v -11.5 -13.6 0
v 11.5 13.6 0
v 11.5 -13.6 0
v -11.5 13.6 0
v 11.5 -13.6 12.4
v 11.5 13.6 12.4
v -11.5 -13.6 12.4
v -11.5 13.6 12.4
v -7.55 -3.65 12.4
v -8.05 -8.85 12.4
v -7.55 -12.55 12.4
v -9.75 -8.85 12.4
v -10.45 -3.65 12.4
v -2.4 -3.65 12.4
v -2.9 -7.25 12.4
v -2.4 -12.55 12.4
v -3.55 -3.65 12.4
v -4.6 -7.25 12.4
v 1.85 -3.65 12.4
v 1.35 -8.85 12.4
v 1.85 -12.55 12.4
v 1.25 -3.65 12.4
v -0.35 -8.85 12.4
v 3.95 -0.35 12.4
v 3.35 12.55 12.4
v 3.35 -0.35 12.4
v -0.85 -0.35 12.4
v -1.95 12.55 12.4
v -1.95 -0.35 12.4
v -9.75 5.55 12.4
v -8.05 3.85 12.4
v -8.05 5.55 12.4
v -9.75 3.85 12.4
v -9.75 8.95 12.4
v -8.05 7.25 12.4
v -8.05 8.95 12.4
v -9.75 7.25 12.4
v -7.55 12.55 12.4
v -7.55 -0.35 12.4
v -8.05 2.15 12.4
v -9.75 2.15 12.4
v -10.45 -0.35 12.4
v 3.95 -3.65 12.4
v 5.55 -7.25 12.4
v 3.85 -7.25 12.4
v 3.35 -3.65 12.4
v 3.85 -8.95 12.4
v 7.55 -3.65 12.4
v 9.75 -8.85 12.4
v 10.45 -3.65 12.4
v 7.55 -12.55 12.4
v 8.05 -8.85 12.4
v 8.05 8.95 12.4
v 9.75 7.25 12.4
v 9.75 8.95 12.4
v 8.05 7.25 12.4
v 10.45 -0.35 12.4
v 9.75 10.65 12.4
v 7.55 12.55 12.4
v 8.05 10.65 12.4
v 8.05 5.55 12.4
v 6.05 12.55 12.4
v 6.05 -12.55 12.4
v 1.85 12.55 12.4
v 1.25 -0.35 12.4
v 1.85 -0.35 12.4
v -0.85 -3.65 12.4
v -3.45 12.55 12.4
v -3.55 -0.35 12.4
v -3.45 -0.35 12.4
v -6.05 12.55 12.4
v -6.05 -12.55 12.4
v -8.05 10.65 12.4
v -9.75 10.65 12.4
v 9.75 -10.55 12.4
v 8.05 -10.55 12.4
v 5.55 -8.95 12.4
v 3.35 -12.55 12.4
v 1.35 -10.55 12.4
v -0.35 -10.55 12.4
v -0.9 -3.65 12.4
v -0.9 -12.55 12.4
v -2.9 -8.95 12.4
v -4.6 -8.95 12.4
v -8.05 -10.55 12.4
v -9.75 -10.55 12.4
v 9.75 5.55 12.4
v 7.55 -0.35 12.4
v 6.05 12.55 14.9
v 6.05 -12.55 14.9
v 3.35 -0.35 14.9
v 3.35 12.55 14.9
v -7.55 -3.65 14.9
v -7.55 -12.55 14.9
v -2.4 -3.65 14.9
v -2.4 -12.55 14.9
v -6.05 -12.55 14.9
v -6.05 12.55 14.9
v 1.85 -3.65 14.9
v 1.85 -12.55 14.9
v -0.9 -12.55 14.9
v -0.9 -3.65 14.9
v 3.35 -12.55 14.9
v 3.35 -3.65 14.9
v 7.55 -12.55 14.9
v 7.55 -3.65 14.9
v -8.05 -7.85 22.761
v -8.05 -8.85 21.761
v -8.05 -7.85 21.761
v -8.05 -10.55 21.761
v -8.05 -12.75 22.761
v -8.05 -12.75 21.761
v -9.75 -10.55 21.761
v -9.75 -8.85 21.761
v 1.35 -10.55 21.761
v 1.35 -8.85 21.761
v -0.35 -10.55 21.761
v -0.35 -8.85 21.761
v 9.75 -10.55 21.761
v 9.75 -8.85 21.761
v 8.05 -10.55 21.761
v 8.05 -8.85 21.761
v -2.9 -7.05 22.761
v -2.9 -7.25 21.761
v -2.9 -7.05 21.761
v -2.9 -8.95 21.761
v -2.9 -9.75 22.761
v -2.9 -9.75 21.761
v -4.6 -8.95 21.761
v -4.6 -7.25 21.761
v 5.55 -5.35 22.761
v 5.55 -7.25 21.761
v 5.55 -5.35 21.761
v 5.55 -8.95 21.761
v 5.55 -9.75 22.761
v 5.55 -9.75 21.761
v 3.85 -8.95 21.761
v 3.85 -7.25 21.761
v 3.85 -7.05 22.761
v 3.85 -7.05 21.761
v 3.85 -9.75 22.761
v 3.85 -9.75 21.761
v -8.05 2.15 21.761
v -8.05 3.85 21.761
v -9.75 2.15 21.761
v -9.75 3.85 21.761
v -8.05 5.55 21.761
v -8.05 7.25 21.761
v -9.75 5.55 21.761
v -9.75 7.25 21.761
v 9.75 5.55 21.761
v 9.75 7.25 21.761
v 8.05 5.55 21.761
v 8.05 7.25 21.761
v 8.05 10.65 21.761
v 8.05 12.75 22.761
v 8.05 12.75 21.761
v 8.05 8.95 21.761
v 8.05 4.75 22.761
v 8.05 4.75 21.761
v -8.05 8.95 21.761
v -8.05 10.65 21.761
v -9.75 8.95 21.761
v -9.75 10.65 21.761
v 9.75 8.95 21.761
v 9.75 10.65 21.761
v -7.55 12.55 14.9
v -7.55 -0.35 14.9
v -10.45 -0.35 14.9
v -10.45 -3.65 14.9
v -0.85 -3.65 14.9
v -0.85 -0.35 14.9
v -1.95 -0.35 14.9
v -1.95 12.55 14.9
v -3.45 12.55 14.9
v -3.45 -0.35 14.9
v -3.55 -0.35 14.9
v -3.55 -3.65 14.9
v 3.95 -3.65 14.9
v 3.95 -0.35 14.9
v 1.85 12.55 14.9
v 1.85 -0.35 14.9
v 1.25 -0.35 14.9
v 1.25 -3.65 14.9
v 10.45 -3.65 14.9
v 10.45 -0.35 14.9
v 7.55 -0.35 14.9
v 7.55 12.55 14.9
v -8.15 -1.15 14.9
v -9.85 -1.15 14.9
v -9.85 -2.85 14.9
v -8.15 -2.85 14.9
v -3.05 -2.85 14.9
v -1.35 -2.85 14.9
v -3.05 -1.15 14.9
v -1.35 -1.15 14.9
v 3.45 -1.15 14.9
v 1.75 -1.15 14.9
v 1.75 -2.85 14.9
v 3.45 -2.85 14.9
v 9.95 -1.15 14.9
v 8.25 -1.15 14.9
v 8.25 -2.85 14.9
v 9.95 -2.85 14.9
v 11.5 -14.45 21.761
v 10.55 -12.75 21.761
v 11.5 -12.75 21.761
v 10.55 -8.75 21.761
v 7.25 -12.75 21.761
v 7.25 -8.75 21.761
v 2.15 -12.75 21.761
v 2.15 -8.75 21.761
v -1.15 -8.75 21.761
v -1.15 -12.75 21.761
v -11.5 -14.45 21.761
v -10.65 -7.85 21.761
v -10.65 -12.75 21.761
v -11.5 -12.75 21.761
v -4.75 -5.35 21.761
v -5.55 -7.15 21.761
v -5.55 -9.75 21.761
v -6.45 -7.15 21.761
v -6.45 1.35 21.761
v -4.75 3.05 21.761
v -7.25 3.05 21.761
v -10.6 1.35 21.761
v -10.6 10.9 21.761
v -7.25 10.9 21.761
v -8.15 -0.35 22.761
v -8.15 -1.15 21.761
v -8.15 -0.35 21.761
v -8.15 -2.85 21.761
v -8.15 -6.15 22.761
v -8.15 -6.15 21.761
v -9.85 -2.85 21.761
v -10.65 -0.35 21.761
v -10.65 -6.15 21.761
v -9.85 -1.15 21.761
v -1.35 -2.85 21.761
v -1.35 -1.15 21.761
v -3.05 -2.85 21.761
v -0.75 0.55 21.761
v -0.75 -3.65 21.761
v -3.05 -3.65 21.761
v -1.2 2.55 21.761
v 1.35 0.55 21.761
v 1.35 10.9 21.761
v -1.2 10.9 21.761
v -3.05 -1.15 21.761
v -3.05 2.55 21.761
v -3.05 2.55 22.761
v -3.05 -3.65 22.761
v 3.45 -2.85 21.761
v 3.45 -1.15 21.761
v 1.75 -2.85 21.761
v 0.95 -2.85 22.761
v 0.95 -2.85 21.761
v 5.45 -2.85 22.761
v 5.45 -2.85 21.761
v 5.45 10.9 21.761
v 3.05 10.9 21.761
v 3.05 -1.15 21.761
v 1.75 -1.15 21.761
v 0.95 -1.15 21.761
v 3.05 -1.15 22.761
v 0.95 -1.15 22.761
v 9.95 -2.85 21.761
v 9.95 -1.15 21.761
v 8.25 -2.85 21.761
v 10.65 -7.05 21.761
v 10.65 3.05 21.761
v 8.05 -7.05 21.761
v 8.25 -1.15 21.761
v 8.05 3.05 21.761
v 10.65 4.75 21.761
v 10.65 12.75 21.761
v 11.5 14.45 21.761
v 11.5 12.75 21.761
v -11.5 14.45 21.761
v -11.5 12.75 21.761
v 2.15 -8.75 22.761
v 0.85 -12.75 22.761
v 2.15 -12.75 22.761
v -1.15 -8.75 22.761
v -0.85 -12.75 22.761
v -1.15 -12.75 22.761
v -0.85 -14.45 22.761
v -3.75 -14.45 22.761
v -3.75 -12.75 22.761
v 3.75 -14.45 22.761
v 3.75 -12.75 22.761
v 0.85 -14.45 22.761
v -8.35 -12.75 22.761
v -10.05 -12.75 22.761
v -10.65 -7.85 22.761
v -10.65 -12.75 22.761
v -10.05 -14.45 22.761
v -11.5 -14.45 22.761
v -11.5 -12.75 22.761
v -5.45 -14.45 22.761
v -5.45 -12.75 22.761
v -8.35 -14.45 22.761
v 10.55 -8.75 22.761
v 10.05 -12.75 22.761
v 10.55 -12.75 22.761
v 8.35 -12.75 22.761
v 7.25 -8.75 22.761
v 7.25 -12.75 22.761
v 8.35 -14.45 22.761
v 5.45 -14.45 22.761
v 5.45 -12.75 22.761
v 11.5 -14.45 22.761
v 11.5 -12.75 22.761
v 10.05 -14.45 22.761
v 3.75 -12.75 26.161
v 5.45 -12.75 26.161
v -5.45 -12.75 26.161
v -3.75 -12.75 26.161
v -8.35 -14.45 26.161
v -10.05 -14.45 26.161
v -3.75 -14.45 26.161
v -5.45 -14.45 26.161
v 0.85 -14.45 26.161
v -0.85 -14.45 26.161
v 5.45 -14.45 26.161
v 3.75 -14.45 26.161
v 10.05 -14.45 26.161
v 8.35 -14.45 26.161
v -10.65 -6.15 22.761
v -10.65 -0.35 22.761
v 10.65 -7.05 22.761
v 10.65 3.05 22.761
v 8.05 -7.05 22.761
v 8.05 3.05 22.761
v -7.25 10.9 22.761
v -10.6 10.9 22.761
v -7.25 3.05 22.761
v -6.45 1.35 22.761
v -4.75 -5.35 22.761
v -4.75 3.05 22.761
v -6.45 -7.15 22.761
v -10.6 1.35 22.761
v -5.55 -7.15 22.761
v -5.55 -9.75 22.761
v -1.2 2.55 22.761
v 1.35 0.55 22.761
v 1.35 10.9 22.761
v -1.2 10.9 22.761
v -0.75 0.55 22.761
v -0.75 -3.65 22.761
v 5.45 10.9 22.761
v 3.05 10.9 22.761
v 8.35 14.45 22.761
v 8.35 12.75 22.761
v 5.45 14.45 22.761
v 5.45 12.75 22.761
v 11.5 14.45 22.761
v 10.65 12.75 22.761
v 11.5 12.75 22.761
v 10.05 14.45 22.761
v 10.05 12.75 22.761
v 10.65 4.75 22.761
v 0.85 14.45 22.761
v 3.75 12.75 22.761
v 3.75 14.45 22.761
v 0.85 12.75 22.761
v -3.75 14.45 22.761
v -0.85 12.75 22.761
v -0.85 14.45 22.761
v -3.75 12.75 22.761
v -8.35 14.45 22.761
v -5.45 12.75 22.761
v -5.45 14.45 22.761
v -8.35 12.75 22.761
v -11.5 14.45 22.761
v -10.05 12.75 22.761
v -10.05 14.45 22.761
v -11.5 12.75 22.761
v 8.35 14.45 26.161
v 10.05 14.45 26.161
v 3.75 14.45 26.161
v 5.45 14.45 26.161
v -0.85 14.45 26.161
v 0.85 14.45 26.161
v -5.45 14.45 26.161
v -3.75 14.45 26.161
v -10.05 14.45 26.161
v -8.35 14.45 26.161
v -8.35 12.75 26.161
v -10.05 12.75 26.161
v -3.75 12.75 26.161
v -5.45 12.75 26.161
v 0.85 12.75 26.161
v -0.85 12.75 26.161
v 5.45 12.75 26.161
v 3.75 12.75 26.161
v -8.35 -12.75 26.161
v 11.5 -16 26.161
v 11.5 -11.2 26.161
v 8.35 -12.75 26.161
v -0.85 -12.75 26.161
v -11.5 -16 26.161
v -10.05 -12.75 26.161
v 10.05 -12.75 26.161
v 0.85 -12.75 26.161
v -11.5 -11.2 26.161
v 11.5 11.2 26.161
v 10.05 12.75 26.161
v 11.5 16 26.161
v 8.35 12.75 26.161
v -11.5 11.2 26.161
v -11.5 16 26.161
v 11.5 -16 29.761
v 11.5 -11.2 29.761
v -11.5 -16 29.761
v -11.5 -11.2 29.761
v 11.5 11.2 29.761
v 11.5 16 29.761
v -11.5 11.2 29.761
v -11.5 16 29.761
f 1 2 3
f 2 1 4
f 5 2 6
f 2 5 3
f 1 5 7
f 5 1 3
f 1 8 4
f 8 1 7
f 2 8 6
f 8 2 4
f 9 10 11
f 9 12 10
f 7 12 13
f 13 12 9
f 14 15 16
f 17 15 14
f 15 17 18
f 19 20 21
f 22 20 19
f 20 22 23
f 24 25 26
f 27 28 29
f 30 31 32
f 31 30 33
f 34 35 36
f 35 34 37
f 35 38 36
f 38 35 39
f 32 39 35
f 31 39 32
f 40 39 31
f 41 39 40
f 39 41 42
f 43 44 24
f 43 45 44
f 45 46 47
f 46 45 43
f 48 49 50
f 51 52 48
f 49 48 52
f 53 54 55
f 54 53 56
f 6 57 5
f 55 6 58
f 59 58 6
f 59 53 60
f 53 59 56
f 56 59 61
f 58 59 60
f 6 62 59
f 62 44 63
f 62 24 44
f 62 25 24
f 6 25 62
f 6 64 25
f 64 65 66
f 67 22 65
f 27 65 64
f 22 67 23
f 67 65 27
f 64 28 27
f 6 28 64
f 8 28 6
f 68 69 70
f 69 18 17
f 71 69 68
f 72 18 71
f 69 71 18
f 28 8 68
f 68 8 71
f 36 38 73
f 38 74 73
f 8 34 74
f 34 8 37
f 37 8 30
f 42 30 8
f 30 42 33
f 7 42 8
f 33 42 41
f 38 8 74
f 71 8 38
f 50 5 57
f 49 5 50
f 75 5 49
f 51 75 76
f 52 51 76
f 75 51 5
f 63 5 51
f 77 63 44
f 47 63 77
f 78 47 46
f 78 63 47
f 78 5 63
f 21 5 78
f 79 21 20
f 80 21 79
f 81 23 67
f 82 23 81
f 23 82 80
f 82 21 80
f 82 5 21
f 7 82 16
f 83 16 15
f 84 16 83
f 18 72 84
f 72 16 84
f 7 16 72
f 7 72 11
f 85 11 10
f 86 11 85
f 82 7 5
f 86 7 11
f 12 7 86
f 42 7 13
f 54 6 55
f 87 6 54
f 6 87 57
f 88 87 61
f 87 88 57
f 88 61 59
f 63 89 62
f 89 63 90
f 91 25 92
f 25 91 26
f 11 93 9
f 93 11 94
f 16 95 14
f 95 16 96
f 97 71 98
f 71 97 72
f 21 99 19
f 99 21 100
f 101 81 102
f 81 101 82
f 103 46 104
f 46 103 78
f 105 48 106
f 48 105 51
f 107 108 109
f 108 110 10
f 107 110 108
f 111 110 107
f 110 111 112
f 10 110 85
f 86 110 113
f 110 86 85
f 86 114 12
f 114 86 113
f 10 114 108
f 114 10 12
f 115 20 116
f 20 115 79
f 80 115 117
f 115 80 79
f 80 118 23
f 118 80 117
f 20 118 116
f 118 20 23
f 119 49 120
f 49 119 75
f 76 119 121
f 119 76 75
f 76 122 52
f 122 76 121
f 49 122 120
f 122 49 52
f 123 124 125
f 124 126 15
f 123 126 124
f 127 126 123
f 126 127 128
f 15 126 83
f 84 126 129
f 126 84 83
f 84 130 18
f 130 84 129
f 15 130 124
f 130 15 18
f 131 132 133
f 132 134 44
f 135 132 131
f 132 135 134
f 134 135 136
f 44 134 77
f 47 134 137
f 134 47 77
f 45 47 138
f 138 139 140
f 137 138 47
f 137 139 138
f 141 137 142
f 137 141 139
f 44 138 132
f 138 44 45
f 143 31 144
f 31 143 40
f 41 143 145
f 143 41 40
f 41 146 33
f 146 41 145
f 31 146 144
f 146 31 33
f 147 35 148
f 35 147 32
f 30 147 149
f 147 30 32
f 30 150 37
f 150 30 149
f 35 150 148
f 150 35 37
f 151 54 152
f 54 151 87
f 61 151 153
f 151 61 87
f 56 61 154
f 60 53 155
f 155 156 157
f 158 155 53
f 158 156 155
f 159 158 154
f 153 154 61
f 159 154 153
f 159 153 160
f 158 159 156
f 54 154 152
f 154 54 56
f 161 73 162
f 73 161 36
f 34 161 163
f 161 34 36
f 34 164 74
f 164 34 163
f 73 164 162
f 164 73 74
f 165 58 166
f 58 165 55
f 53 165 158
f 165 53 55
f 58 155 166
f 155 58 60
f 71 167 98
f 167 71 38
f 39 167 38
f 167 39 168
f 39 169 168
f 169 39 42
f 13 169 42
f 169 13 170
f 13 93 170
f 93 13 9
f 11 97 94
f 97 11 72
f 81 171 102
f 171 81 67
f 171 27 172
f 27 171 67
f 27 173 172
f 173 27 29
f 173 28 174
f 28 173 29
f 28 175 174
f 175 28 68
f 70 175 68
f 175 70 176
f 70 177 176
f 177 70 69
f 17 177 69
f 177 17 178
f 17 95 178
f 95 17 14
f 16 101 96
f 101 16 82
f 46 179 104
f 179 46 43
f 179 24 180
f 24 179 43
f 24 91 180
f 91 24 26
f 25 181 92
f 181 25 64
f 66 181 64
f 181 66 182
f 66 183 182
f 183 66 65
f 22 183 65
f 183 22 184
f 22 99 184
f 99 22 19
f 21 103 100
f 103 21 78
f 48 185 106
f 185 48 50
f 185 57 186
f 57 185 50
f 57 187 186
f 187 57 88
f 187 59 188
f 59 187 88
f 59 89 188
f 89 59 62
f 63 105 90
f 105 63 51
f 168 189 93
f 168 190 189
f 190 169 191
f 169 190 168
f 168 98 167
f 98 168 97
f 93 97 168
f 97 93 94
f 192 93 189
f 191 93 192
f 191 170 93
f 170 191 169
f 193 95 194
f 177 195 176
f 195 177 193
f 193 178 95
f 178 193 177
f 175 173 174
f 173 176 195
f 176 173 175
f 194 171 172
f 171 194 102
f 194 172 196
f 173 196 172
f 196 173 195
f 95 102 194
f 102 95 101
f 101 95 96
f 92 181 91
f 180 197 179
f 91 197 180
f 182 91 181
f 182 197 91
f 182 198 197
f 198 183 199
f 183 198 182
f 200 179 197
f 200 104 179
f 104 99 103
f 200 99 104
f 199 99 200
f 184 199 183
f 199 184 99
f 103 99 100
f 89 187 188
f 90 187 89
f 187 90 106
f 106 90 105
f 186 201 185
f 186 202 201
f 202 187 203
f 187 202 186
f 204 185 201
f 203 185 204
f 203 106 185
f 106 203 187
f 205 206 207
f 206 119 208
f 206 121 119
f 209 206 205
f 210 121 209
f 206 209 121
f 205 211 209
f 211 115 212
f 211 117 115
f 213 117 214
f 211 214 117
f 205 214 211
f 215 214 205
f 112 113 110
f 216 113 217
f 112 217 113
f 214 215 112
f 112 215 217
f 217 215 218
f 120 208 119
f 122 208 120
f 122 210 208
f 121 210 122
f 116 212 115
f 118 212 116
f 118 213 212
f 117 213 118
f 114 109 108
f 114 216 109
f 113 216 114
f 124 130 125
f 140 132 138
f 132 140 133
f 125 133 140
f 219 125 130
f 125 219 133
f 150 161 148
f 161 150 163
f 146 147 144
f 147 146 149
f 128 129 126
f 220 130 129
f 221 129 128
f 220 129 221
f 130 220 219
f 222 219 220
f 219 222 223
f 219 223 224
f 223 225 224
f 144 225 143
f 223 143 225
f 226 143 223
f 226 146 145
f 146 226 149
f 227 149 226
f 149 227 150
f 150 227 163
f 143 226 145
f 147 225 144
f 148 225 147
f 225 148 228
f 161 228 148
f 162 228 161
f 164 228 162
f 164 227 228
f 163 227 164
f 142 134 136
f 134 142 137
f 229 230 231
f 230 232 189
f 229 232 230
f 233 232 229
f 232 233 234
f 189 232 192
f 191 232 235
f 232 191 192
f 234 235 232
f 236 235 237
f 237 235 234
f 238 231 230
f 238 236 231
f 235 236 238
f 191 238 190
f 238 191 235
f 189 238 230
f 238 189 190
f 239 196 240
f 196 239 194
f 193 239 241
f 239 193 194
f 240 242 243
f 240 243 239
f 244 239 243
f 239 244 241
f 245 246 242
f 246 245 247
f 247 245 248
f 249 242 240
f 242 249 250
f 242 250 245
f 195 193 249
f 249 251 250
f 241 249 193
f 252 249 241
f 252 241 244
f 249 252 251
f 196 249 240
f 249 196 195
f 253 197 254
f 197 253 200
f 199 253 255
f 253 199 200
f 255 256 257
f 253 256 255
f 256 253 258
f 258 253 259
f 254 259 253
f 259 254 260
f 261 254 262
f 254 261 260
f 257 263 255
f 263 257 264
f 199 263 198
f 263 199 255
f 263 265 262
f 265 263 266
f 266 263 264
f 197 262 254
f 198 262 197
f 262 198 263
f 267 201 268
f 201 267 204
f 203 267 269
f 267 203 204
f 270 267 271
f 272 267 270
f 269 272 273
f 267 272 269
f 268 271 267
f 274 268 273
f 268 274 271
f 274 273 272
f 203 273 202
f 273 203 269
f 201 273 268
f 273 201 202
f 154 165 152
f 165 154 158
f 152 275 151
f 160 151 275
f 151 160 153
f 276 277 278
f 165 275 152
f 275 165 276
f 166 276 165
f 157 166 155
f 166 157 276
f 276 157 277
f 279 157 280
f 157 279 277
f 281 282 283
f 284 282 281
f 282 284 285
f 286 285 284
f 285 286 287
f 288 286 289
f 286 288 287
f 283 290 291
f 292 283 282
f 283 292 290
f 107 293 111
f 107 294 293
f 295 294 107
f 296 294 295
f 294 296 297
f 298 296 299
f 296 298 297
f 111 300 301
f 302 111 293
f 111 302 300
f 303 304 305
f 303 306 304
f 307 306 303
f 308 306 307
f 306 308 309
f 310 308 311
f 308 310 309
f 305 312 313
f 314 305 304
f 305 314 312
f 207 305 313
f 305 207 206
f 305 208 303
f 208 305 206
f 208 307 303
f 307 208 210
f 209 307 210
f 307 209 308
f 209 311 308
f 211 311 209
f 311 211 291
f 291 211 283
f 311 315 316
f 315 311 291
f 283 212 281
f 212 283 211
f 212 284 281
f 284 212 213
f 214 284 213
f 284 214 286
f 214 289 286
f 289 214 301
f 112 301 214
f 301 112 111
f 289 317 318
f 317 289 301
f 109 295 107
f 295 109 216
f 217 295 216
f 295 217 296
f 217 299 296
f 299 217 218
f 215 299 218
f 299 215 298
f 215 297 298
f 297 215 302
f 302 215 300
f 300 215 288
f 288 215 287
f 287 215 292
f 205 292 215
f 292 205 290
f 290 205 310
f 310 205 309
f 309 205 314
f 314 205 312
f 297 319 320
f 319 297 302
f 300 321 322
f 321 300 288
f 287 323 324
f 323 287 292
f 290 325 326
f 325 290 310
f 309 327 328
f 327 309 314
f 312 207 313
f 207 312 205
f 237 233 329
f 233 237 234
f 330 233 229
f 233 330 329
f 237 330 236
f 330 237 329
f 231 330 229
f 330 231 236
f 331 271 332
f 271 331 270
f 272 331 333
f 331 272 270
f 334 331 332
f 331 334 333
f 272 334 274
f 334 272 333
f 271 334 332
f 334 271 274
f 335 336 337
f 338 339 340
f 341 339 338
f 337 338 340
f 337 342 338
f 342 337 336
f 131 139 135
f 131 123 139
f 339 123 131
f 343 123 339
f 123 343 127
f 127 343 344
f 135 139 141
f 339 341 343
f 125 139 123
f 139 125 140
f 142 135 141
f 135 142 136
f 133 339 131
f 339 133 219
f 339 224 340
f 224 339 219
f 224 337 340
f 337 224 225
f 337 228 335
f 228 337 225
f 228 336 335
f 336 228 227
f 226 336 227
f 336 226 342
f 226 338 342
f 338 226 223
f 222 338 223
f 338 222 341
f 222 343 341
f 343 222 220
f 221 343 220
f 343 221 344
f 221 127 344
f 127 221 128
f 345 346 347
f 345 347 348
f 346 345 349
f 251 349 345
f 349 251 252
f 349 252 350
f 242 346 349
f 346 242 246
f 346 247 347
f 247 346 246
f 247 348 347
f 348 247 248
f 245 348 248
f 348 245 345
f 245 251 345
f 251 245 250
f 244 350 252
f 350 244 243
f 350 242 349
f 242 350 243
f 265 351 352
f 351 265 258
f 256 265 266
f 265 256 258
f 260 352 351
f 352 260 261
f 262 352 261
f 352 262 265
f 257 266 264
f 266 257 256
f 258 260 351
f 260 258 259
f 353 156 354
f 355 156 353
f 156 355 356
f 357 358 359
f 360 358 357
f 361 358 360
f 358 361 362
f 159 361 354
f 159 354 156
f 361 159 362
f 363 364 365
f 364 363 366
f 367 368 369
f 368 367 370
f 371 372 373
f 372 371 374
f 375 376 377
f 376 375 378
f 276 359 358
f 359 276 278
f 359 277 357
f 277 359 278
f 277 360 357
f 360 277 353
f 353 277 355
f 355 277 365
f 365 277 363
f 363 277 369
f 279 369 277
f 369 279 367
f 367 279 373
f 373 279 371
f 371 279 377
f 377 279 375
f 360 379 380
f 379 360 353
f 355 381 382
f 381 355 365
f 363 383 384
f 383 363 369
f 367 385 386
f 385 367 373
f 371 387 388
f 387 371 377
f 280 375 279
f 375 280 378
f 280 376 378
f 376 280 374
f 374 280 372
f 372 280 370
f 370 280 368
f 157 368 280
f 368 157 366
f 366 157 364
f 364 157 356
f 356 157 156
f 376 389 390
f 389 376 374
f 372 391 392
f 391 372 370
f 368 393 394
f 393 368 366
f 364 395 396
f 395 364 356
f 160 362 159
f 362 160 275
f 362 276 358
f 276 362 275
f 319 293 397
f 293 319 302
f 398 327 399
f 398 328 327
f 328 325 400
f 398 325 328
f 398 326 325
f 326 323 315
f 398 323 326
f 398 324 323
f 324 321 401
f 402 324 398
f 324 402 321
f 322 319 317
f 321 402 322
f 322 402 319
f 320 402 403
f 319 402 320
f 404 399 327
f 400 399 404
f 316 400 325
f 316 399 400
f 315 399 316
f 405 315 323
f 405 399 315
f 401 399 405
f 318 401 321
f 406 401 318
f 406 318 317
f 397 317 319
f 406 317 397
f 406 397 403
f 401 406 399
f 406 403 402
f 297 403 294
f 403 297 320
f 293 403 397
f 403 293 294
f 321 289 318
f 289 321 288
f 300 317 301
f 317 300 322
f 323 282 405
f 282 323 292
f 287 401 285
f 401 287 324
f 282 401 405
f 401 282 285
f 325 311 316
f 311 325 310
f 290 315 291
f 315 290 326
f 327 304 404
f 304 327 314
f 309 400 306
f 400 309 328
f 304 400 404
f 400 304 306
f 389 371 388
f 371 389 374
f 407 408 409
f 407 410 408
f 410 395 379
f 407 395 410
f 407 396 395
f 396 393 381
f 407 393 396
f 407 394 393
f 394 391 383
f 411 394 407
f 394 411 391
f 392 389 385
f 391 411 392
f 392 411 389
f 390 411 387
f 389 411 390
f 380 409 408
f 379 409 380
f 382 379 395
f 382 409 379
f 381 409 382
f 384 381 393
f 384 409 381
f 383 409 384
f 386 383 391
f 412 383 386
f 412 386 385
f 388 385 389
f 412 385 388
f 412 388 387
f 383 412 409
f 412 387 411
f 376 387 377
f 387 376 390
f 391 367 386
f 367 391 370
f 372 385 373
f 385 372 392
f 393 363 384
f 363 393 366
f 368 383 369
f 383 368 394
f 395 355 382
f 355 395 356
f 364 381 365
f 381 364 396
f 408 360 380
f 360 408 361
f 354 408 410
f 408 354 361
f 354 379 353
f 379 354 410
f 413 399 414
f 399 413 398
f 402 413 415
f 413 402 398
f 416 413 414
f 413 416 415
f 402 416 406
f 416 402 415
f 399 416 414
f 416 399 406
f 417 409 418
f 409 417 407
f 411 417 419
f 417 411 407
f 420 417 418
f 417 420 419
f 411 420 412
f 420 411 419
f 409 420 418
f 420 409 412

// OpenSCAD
// Generated by SolidPython 0.4.2 on 2020-09-29 23:21:37
//!OpenSCAD

scale(v = 0.0100000000) {
	translate(v = [-1150, -1360, 0]) {
		union() {
			color(c = [0.4000000000, 0.4000000000, 0.4000000000]) {
				translate(v = [0, 0, 0]) {
					linear_extrude(height = 1000.0000000000) {
						polygon(paths = [[0, 1, 2, 3]], points = [[0, 0], [0, 2720], [2300, 2720], [2300, 0]]);
					}
				}
			}
			color(c = [0.2000000000, 0.6000000000, 0.2000000000]) {
				translate(v = [0, 0, 1000.0000000000]) {
					linear_extrude(height = 120.0000000000) {
						polygon(paths = [[0, 1, 2, 3]], points = [[0, 1305], [0, 2720], [2300, 2720], [2300, 1305]]);
					}
				}
			}
			color(c = [0.4000000000, 0.4000000000, 0.4000000000]) {
				translate(v = [0, 0, 1000.0000000000]) {
					linear_extrude(height = 120.0000000000) {
						polygon(paths = [[0, 1, 2, 3]], points = [[0, 0], [0, 1305], [2300, 1305], [2300, 0]]);
					}
				}
			}
			color(c = [0.9000000000, 0.6000000000, 0.6000000000]) {
				translate(v = [0, 0, 1120.0000000000]) {
					linear_extrude(height = 120.0000000000) {
						polygon(paths = [[0, 1, 2, 3]], points = [[135, 1485], [135, 2485], [395, 2485], [395, 1485]]);
					}
				}
			}
			color(c = [0.9000000000, 0.6000000000, 0.6000000000]) {
				translate(v = [0, 0, 1120.0000000000]) {
					linear_extrude(height = 120.0000000000) {
						polygon(paths = [[0, 1, 2, 3]], points = [[545, 1485], [545, 2485], [805, 2485], [805, 1485]]);
					}
				}
			}
			color(c = [0.9000000000, 0.6000000000, 0.6000000000]) {
				translate(v = [0, 0, 1120.0000000000]) {
					linear_extrude(height = 120.0000000000) {
						polygon(paths = [[0, 1, 2, 3]], points = [[955, 1485], [955, 2485], [1335, 2485], [1335, 1485]]);
					}
				}
			}
			color(c = [0.9000000000, 0.6000000000, 0.6000000000]) {
				translate(v = [0, 0, 1120.0000000000]) {
					linear_extrude(height = 120.0000000000) {
						polygon(paths = [[0, 1, 2, 3]], points = [[1485, 1485], [1485, 2485], [1755, 2485], [1755, 1485]]);
					}
				}
			}
			color(c = [0.9000000000, 0.6000000000, 0.6000000000]) {
				translate(v = [0, 0, 1120.0000000000]) {
					linear_extrude(height = 120.0000000000) {
						polygon(paths = [[0, 1, 2, 3]], points = [[1905, 1485], [1905, 2485], [2165, 2485], [2165, 1485]]);
					}
				}
			}
			color(c = [0.9000000000, 0.6000000000, 0.9000000000]) {
				translate(v = [0, 0, 1120.0000000000]) {
					linear_extrude(height = 120.0000000000) {
						polygon(paths = [[0, 1, 2, 3]], points = [[135, 235], [135, 885], [395, 885], [395, 235]]);
					}
				}
			}
			color(c = [0.9000000000, 0.6000000000, 0.9000000000]) {
				translate(v = [0, 0, 1120.0000000000]) {
					linear_extrude(height = 120.0000000000) {
						polygon(paths = [[0, 1, 2, 3]], points = [[545, 235], [545, 885], [910, 885], [910, 235]]);
					}
				}
			}
			color(c = [0.9000000000, 0.6000000000, 0.9000000000]) {
				translate(v = [0, 0, 1120.0000000000]) {
					linear_extrude(height = 120.0000000000) {
						polygon(paths = [[0, 1, 2, 3]], points = [[1060, 235], [1060, 885], [1335, 885], [1335, 235]]);
					}
				}
			}
			color(c = [0.9000000000, 0.6000000000, 0.9000000000]) {
				translate(v = [0, 0, 1120.0000000000]) {
					linear_extrude(height = 120.0000000000) {
						polygon(paths = [[0, 1, 2, 3]], points = [[1485, 235], [1485, 885], [1755, 885], [1755, 235]]);
					}
				}
			}
			color(c = [0.9000000000, 0.6000000000, 0.9000000000]) {
				translate(v = [0, 0, 1120.0000000000]) {
					linear_extrude(height = 120.0000000000) {
						polygon(paths = [[0, 1, 2, 3]], points = [[1905, 235], [1905, 885], [2165, 885], [2165, 235]]);
					}
				}
			}
			color(c = [0.2000000000, 0.6000000000, 0.2000000000]) {
				translate(v = [0, 0, 1120.0000000000]) {
					linear_extrude(height = 120.0000000000) {
						difference() {
							polygon(paths = [[0, 1, 2, 3]], points = [[0, 1305], [0, 2720], [2300, 2720], [2300, 1305]]);
							polygon(paths = [[0, 1, 2, 3]], points = [[135, 1485], [395, 1485], [395, 2485], [135, 2485]]);
							polygon(paths = [[0, 1, 2, 3]], points = [[545, 1485], [805, 1485], [805, 2485], [545, 2485]]);
							polygon(paths = [[0, 1, 2, 3]], points = [[955, 1485], [1335, 1485], [1335, 2485], [955, 2485]]);
							polygon(paths = [[0, 1, 2, 3]], points = [[1485, 1485], [1755, 1485], [1755, 2485], [1485, 2485]]);
							polygon(paths = [[0, 1, 2, 3]], points = [[1905, 1485], [2165, 1485], [2165, 2485], [1905, 2485]]);
						}
					}
				}
			}
			color(c = [0.4000000000, 0.4000000000, 0.4000000000]) {
				translate(v = [0, 0, 1120.0000000000]) {
					linear_extrude(height = 120.0000000000) {
						difference() {
							polygon(paths = [[0, 1, 2, 3]], points = [[0, 0], [0, 1305], [2300, 1305], [2300, 0]]);
							polygon(paths = [[0, 1, 2, 3]], points = [[135, 235], [395, 235], [395, 885], [135, 885]]);
							polygon(paths = [[0, 1, 2, 3]], points = [[545, 235], [910, 235], [910, 885], [545, 885]]);
							polygon(paths = [[0, 1, 2, 3]], points = [[1060, 235], [1335, 235], [1335, 885], [1060, 885]]);
							polygon(paths = [[0, 1, 2, 3]], points = [[1485, 235], [1755, 235], [1755, 885], [1485, 885]]);
							polygon(paths = [[0, 1, 2, 3]], points = [[1905, 235], [2165, 235], [2165, 885], [1905, 885]]);
						}
					}
				}
			}
			color(c = [0.1000000000, 0.1000000000, 0.1000000000]) {
				translate(v = [0, 0, 1240.0000000000]) {
					linear_extrude(height = 70.0000000000) {
						polygon(paths = [[0, 1, 2, 3]], points = [[175, 305], [175, 475], [345, 475], [345, 305]]);
					}
				}
			}
			color(c = [0.1000000000, 0.1000000000, 0.1000000000]) {
				translate(v = [0, 0, 1240.0000000000]) {
					linear_extrude(height = 70.0000000000) {
						polygon(paths = [[0, 1, 2, 3]], points = [[1115, 305], [1115, 475], [1285, 475], [1285, 305]]);
					}
				}
			}
			color(c = [0.1000000000, 0.1000000000, 0.1000000000]) {
				translate(v = [0, 0, 1240.0000000000]) {
					linear_extrude(height = 70.0000000000) {
						polygon(paths = [[0, 1, 2, 3]], points = [[1955, 305], [1955, 475], [2125, 475], [2125, 305]]);
					}
				}
			}
			color(c = [0.1000000000, 0.1000000000, 0.1000000000]) {
				translate(v = [0, 0, 1240.0000000000]) {
					linear_extrude(height = 70.0000000000) {
						polygon(paths = [[0, 1, 2, 3]], points = [[690, 465], [690, 635], [860, 635], [860, 465]]);
					}
				}
			}
			color(c = [0.1000000000, 0.1000000000, 0.1000000000]) {
				translate(v = [0, 0, 1240.0000000000]) {
					linear_extrude(height = 70.0000000000) {
						polygon(paths = [[0, 1, 2, 3]], points = [[1535, 465], [1535, 635], [1705, 635], [1705, 465]]);
					}
				}
			}
			color(c = [0.1000000000, 0.1000000000, 0.1000000000]) {
				translate(v = [0, 0, 1240.0000000000]) {
					linear_extrude(height = 70.0000000000) {
						polygon(paths = [[0, 1, 2, 3]], points = [[175, 1575], [175, 1745], [345, 1745], [345, 1575]]);
					}
				}
			}
			color(c = [0.1000000000, 0.1000000000, 0.1000000000]) {
				translate(v = [0, 0, 1240.0000000000]) {
					linear_extrude(height = 70.0000000000) {
						polygon(paths = [[0, 1, 2, 3]], points = [[175, 1915], [175, 2085], [345, 2085], [345, 1915]]);
					}
				}
			}
			color(c = [0.1000000000, 0.1000000000, 0.1000000000]) {
				translate(v = [0, 0, 1240.0000000000]) {
					linear_extrude(height = 70.0000000000) {
						polygon(paths = [[0, 1, 2, 3]], points = [[1955, 1915], [1955, 2085], [2125, 2085], [2125, 1915]]);
					}
				}
			}
			color(c = [0.1000000000, 0.1000000000, 0.1000000000]) {
				translate(v = [0, 0, 1240.0000000000]) {
					linear_extrude(height = 70.0000000000) {
						polygon(paths = [[0, 1, 2, 3]], points = [[175, 2255], [175, 2425], [345, 2425], [345, 2255]]);
					}
				}
			}
			color(c = [0.1000000000, 0.1000000000, 0.1000000000]) {
				translate(v = [0, 0, 1240.0000000000]) {
					linear_extrude(height = 70.0000000000) {
						polygon(paths = [[0, 1, 2, 3]], points = [[1955, 2255], [1955, 2425], [2125, 2425], [2125, 2255]]);
					}
				}
			}
			color(c = [1.0000000000, 1.0000000000, 1.0000000000]) {
				translate(v = [0, 0, 1240.0000000000]) {
					linear_extrude(height = 70.0000000000) {
						polygon(paths = [[0, 1, 2, 3, 4, 5, 6, 7]], points = [[395, 105], [395, 995], [105, 995], [105, 1325], [395, 1325], [395, 2615], [545, 2615], [545, 105]]);
					}
				}
			}
			color(c = [1.0000000000, 1.0000000000, 1.0000000000]) {
				translate(v = [0, 0, 1240.0000000000]) {
					linear_extrude(height = 70.0000000000) {
						polygon(paths = [[0, 1, 2, 3, 4, 5, 6, 7, 8, 9, 10, 11]], points = [[910, 105], [910, 995], [795, 995], [795, 1325], [805, 1325], [805, 2615], [955, 2615], [955, 1325], [1065, 1325], [1065, 995], [1060, 995], [1060, 105]]);
					}
				}
			}
			color(c = [1.0000000000, 1.0000000000, 1.0000000000]) {
				translate(v = [0, 0, 1240.0000000000]) {
					linear_extrude(height = 70.0000000000) {
						polygon(paths = [[0, 1, 2, 3, 4, 5, 6, 7, 8, 9, 10, 11]], points = [[1335, 105], [1335, 995], [1275, 995], [1275, 1325], [1335, 1325], [1335, 2615], [1485, 2615], [1485, 1325], [1545, 1325], [1545, 995], [1485, 995], [1485, 105]]);
					}
				}
			}
			color(c = [1.0000000000, 1.0000000000, 1.0000000000]) {
				translate(v = [0, 0, 1240.0000000000]) {
					linear_extrude(height = 70.0000000000) {
						polygon(paths = [[0, 1, 2, 3, 4, 5, 6, 7]], points = [[1755, 105], [1755, 2615], [1905, 2615], [1905, 1325], [2195, 1325], [2195, 995], [1905, 995], [1905, 105]]);
					}
				}
			}
			color(c = [0.1000000000, 0.1000000000, 0.1000000000]) {
				translate(v = [0, 0, 1310.0000000000]) {
					linear_extrude(height = 180.0000000000) {
						polygon(paths = [[0, 1, 2, 3]], points = [[175, 305], [175, 475], [345, 475], [345, 305]]);
					}
				}
			}
			color(c = [0.1000000000, 0.1000000000, 0.1000000000]) {
				translate(v = [0, 0, 1310.0000000000]) {
					linear_extrude(height = 180.0000000000) {
						polygon(paths = [[0, 1, 2, 3]], points = [[1115, 305], [1115, 475], [1285, 475], [1285, 305]]);
					}
				}
			}
			color(c = [0.1000000000, 0.1000000000, 0.1000000000]) {
				translate(v = [0, 0, 1310.0000000000]) {
					linear_extrude(height = 180.0000000000) {
						polygon(paths = [[0, 1, 2, 3]], points = [[1955, 305], [1955, 475], [2125, 475], [2125, 305]]);
					}
				}
			}
			color(c = [0.1000000000, 0.1000000000, 0.1000000000]) {
				translate(v = [0, 0, 1310.0000000000]) {
					linear_extrude(height = 180.0000000000) {
						polygon(paths = [[0, 1, 2, 3]], points = [[690, 465], [690, 635], [860, 635], [860, 465]]);
					}
				}
			}
			color(c = [0.1000000000, 0.1000000000, 0.1000000000]) {
				translate(v = [0, 0, 1310.0000000000]) {
					linear_extrude(height = 180.0000000000) {
						polygon(paths = [[0, 1, 2, 3]], points = [[1535, 465], [1535, 635], [1705, 635], [1705, 465]]);
					}
				}
			}
			color(c = [0.1000000000, 0.1000000000, 0.1000000000]) {
				translate(v = [0, 0, 1310.0000000000]) {
					linear_extrude(height = 180.0000000000) {
						polygon(paths = [[0, 1, 2, 3]], points = [[175, 1575], [175, 1745], [345, 1745], [345, 1575]]);
					}
				}
			}
			color(c = [0.1000000000, 0.1000000000, 0.1000000000]) {
				translate(v = [0, 0, 1310.0000000000]) {
					linear_extrude(height = 180.0000000000) {
						polygon(paths = [[0, 1, 2, 3]], points = [[175, 1915], [175, 2085], [345, 2085], [345, 1915]]);
					}
				}
			}
			color(c = [0.1000000000, 0.1000000000, 0.1000000000]) {
				translate(v = [0, 0, 1310.0000000000]) {
					linear_extrude(height = 180.0000000000) {
						polygon(paths = [[0, 1, 2, 3]], points = [[1955, 1915], [1955, 2085], [2125, 2085], [2125, 1915]]);
					}
				}
			}
			color(c = [0.1000000000, 0.1000000000, 0.1000000000]) {
				translate(v = [0, 0, 1310.0000000000]) {
					linear_extrude(height = 180.0000000000) {
						polygon(paths = [[0, 1, 2, 3]], points = [[175, 2255], [175, 2425], [345, 2425], [345, 2255]]);
					}
				}
			}
			color(c = [0.1000000000, 0.1000000000, 0.1000000000]) {
				translate(v = [0, 0, 1310.0000000000]) {
					linear_extrude(height = 180.0000000000) {
						polygon(paths = [[0, 1, 2, 3]], points = [[1955, 2255], [1955, 2425], [2125, 2425], [2125, 2255]]);
					}
				}
			}
			color(c = [0.7000000000, 0, 0]) {
				translate(v = [0, 0, 1310.0000000000]) {
					linear_extrude(height = 180.0000000000) {
						polygon(paths = [[0, 1, 2, 3, 4, 5, 6, 7]], points = [[395, 105], [395, 995], [105, 995], [105, 1325], [395, 1325], [395, 2615], [545, 2615], [545, 105]]);
					}
				}
			}
			color(c = [0.7000000000, 0, 0]) {
				translate(v = [0, 0, 1310.0000000000]) {
					linear_extrude(height = 180.0000000000) {
						polygon(paths = [[0, 1, 2, 3, 4, 5, 6, 7, 8, 9, 10, 11]], points = [[910, 105], [910, 995], [795, 995], [795, 1325], [805, 1325], [805, 2615], [955, 2615], [955, 1325], [1065, 1325], [1065, 995], [1060, 995], [1060, 105]]);
					}
				}
			}
			color(c = [0.7000000000, 0, 0]) {
				translate(v = [0, 0, 1310.0000000000]) {
					linear_extrude(height = 180.0000000000) {
						polygon(paths = [[0, 1, 2, 3, 4, 5, 6, 7, 8, 9, 10, 11]], points = [[1335, 105], [1335, 995], [1275, 995], [1275, 1325], [1335, 1325], [1335, 2615], [1485, 2615], [1485, 1325], [1545, 1325], [1545, 995], [1485, 995], [1485, 105]]);
					}
				}
			}
			color(c = [0.7000000000, 0, 0]) {
				translate(v = [0, 0, 1310.0000000000]) {
					linear_extrude(height = 180.0000000000) {
						polygon(paths = [[0, 1, 2, 3, 4, 5, 6, 7]], points = [[1755, 105], [1755, 2615], [1905, 2615], [1905, 1325], [2195, 1325], [2195, 995], [1905, 995], [1905, 105]]);
					}
				}
			}
			color(c = [0.1000000000, 0.1000000000, 0.1000000000]) {
				translate(v = [0, 0, 1490.0000000000]) {
					linear_extrude(height = 686.1000000000) {
						polygon(paths = [[0, 1, 2, 3]], points = [[175, 305], [175, 475], [345, 475], [345, 305]]);
					}
				}
			}
			color(c = [0.1000000000, 0.1000000000, 0.1000000000]) {
				translate(v = [0, 0, 1490.0000000000]) {
					linear_extrude(height = 686.1000000000) {
						polygon(paths = [[0, 1, 2, 3]], points = [[1115, 305], [1115, 475], [1285, 475], [1285, 305]]);
					}
				}
			}
			color(c = [0.1000000000, 0.1000000000, 0.1000000000]) {
				translate(v = [0, 0, 1490.0000000000]) {
					linear_extrude(height = 686.1000000000) {
						polygon(paths = [[0, 1, 2, 3]], points = [[1955, 305], [1955, 475], [2125, 475], [2125, 305]]);
					}
				}
			}
			color(c = [0.1000000000, 0.1000000000, 0.1000000000]) {
				translate(v = [0, 0, 1490.0000000000]) {
					linear_extrude(height = 686.1000000000) {
						polygon(paths = [[0, 1, 2, 3]], points = [[690, 465], [690, 635], [860, 635], [860, 465]]);
					}
				}
			}
			color(c = [0.1000000000, 0.1000000000, 0.1000000000]) {
				translate(v = [0, 0, 1490.0000000000]) {
					linear_extrude(height = 686.1000000000) {
						polygon(paths = [[0, 1, 2, 3]], points = [[1535, 465], [1535, 635], [1705, 635], [1705, 465]]);
					}
				}
			}
			color(c = [0.1000000000, 0.1000000000, 0.1000000000]) {
				translate(v = [0, 0, 1490.0000000000]) {
					linear_extrude(height = 686.1000000000) {
						polygon(paths = [[0, 1, 2, 3]], points = [[165, 1075], [165, 1245], [335, 1245], [335, 1075]]);
					}
				}
			}
			color(c = [0.1000000000, 0.1000000000, 0.1000000000]) {
				translate(v = [0, 0, 1490.0000000000]) {
					linear_extrude(height = 686.1000000000) {
						polygon(paths = [[0, 1, 2, 3]], points = [[845, 1075], [845, 1245], [1015, 1245], [1015, 1075]]);
					}
				}
			}
			color(c = [0.1000000000, 0.1000000000, 0.1000000000]) {
				translate(v = [0, 0, 1490.0000000000]) {
					linear_extrude(height = 686.1000000000) {
						polygon(paths = [[0, 1, 2, 3]], points = [[1325, 1075], [1325, 1245], [1495, 1245], [1495, 1075]]);
					}
				}
			}
			color(c = [0.1000000000, 0.1000000000, 0.1000000000]) {
				translate(v = [0, 0, 1490.0000000000]) {
					linear_extrude(height = 686.1000000000) {
						polygon(paths = [[0, 1, 2, 3]], points = [[1975, 1075], [1975, 1245], [2145, 1245], [2145, 1075]]);
					}
				}
			}
			color(c = [0.1000000000, 0.1000000000, 0.1000000000]) {
				translate(v = [0, 0, 1490.0000000000]) {
					linear_extrude(height = 686.1000000000) {
						polygon(paths = [[0, 1, 2, 3]], points = [[175, 1575], [175, 1745], [345, 1745], [345, 1575]]);
					}
				}
			}
			color(c = [0.1000000000, 0.1000000000, 0.1000000000]) {
				translate(v = [0, 0, 1490.0000000000]) {
					linear_extrude(height = 686.1000000000) {
						polygon(paths = [[0, 1, 2, 3]], points = [[175, 1915], [175, 2085], [345, 2085], [345, 1915]]);
					}
				}
			}
			color(c = [0.1000000000, 0.1000000000, 0.1000000000]) {
				translate(v = [0, 0, 1490.0000000000]) {
					linear_extrude(height = 686.1000000000) {
						polygon(paths = [[0, 1, 2, 3]], points = [[1955, 1915], [1955, 2085], [2125, 2085], [2125, 1915]]);
					}
				}
			}
			color(c = [0.1000000000, 0.1000000000, 0.1000000000]) {
				translate(v = [0, 0, 1490.0000000000]) {
					linear_extrude(height = 686.1000000000) {
						polygon(paths = [[0, 1, 2, 3]], points = [[175, 2255], [175, 2425], [345, 2425], [345, 2255]]);
					}
				}
			}
			color(c = [0.1000000000, 0.1000000000, 0.1000000000]) {
				translate(v = [0, 0, 1490.0000000000]) {
					linear_extrude(height = 686.1000000000) {
						polygon(paths = [[0, 1, 2, 3]], points = [[1955, 2255], [1955, 2425], [2125, 2425], [2125, 2255]]);
					}
				}
			}
			color(c = [0.9000000000, 0.6000000000, 0.6000000000]) {
				translate(v = [0, 0, 2176.1000000000]) {
					linear_extrude(height = 100.0000000000) {
						polygon(paths = [[0, 1, 2, 3, 4, 5, 6, 7, 8, 9, 10, 11, 12, 13, 14, 15]], points = [[0, -85], [0, 85], [85, 85], [85, 575], [345, 575], [345, 85], [1035, 85], [1035, 485], [1365, 485], [1365, 85], [1875, 85], [1875, 485], [2205, 485], [2205, 85], [2300, 85], [2300, -85]]);
					}
				}
			}
			color(c = [0.9000000000, 0.6000000000, 0.6000000000]) {
				translate(v = [0, 0, 2176.1000000000]) {
					linear_extrude(height = 100.0000000000) {
						polygon(paths = [[0, 1, 2, 3]], points = [[85, 745], [85, 1325], [335, 1325], [335, 745]]);
					}
				}
			}
			color(c = [0.9000000000, 0.6000000000, 0.6000000000]) {
				translate(v = [0, 0, 2176.1000000000]) {
					linear_extrude(height = 100.0000000000) {
						polygon(paths = [[0, 1, 2, 3]], points = [[1955, 655], [1955, 1665], [2215, 1665], [2215, 655]]);
					}
				}
			}
			color(c = [0.9000000000, 0.6000000000, 0.6000000000]) {
				translate(v = [0, 0, 2176.1000000000]) {
					linear_extrude(height = 100.0000000000) {
						polygon(paths = [[0, 1, 2, 3, 4, 5, 6, 7, 8, 9, 10, 11, 12, 13, 14, 15]], points = [[595, 385], [595, 645], [505, 645], [505, 1495], [90, 1495], [90, 2450], [425, 2450], [425, 1665], [675, 1665], [675, 825], [1705, 825], [1705, 385], [1535, 385], [1535, 655], [860, 655], [860, 385]]);
					}
				}
			}
			color(c = [0.9000000000, 0.6000000000, 0.6000000000]) {
				translate(v = [0, 0, 2176.1000000000]) {
					linear_extrude(height = 100.0000000000) {
						polygon(paths = [[0, 1, 2, 3, 4, 5, 6, 7]], points = [[845, 995], [845, 1615], [1030, 1615], [1030, 2450], [1285, 2450], [1285, 1415], [1075, 1415], [1075, 995]]);
					}
				}
			}
			color(c = [0.9000000000, 0.6000000000, 0.6000000000]) {
				translate(v = [0, 0, 2176.1000000000]) {
					linear_extrude(height = 100.0000000000) {
						polygon(paths = [[0, 1, 2, 3, 4, 5]], points = [[1245, 1075], [1245, 1245], [1455, 1245], [1455, 2450], [1695, 2450], [1695, 1075]]);
					}
				}
			}
			color(c = [0.9000000000, 0.6000000000, 0.6000000000]) {
				translate(v = [0, 0, 2176.1000000000]) {
					linear_extrude(height = 100.0000000000) {
						polygon(paths = [[0, 1, 2, 3, 4, 5, 6, 7]], points = [[1955, 1835], [1955, 2635], [0, 2635], [0, 2805], [2300, 2805], [2300, 2635], [2215, 2635], [2215, 1835]]);
					}
				}
			}
			color(c = [0.5000000000, 0.5000000000, 0.5000000000]) {
				translate(v = [0, 0, 2276.1000000000]) {
					linear_extrude(height = 340.0000000000) {
						polygon(paths = [[0, 1, 2, 3]], points = [[145, -85], [145, 85], [315, 85], [315, -85]]);
					}
				}
			}
			color(c = [0.5000000000, 0.5000000000, 0.5000000000]) {
				translate(v = [0, 0, 2276.1000000000]) {
					linear_extrude(height = 340.0000000000) {
						polygon(paths = [[0, 1, 2, 3]], points = [[605, -85], [605, 85], [775, 85], [775, -85]]);
					}
				}
			}
			color(c = [0.5000000000, 0.5000000000, 0.5000000000]) {
				translate(v = [0, 0, 2276.1000000000]) {
					linear_extrude(height = 340.0000000000) {
						polygon(paths = [[0, 1, 2, 3]], points = [[1065, -85], [1065, 85], [1235, 85], [1235, -85]]);
					}
				}
			}
			color(c = [0.5000000000, 0.5000000000, 0.5000000000]) {
				translate(v = [0, 0, 2276.1000000000]) {
					linear_extrude(height = 340.0000000000) {
						polygon(paths = [[0, 1, 2, 3]], points = [[1525, -85], [1525, 85], [1695, 85], [1695, -85]]);
					}
				}
			}
			color(c = [0.5000000000, 0.5000000000, 0.5000000000]) {
				translate(v = [0, 0, 2276.1000000000]) {
					linear_extrude(height = 340.0000000000) {
						polygon(paths = [[0, 1, 2, 3]], points = [[1985, -85], [1985, 85], [2155, 85], [2155, -85]]);
					}
				}
			}
			color(c = [0.5000000000, 0.5000000000, 0.5000000000]) {
				translate(v = [0, 0, 2276.1000000000]) {
					linear_extrude(height = 340.0000000000) {
						polygon(paths = [[0, 1, 2, 3]], points = [[145, 2635], [145, 2805], [315, 2805], [315, 2635]]);
					}
				}
			}
			color(c = [0.5000000000, 0.5000000000, 0.5000000000]) {
				translate(v = [0, 0, 2276.1000000000]) {
					linear_extrude(height = 340.0000000000) {
						polygon(paths = [[0, 1, 2, 3]], points = [[605, 2635], [605, 2805], [775, 2805], [775, 2635]]);
					}
				}
			}
			color(c = [0.5000000000, 0.5000000000, 0.5000000000]) {
				translate(v = [0, 0, 2276.1000000000]) {
					linear_extrude(height = 340.0000000000) {
						polygon(paths = [[0, 1, 2, 3]], points = [[1065, 2635], [1065, 2805], [1235, 2805], [1235, 2635]]);
					}
				}
			}
			color(c = [0.5000000000, 0.5000000000, 0.5000000000]) {
				translate(v = [0, 0, 2276.1000000000]) {
					linear_extrude(height = 340.0000000000) {
						polygon(paths = [[0, 1, 2, 3]], points = [[1525, 2635], [1525, 2805], [1695, 2805], [1695, 2635]]);
					}
				}
			}
			color(c = [0.5000000000, 0.5000000000, 0.5000000000]) {
				translate(v = [0, 0, 2276.1000000000]) {
					linear_extrude(height = 340.0000000000) {
						polygon(paths = [[0, 1, 2, 3]], points = [[1985, 2635], [1985, 2805], [2155, 2805], [2155, 2635]]);
					}
				}
			}
			color(c = [0.3000000000, 0.3000000000, 1]) {
				translate(v = [0, 0, 2616.1000000000]) {
					linear_extrude(height = 360.0000000000) {
						polygon(paths = [[0, 1, 2, 3]], points = [[0, -240], [0, 240], [2300, 240], [2300, -240]]);
					}
				}
			}
			color(c = [0.3000000000, 0.3000000000, 1]) {
				translate(v = [0, 0, 2616.1000000000]) {
					linear_extrude(height = 360.0000000000) {
						polygon(paths = [[0, 1, 2, 3]], points = [[0, 2480], [0, 2960], [2300, 2960], [2300, 2480]]);
					}
				}
			}
		}
	}
}
